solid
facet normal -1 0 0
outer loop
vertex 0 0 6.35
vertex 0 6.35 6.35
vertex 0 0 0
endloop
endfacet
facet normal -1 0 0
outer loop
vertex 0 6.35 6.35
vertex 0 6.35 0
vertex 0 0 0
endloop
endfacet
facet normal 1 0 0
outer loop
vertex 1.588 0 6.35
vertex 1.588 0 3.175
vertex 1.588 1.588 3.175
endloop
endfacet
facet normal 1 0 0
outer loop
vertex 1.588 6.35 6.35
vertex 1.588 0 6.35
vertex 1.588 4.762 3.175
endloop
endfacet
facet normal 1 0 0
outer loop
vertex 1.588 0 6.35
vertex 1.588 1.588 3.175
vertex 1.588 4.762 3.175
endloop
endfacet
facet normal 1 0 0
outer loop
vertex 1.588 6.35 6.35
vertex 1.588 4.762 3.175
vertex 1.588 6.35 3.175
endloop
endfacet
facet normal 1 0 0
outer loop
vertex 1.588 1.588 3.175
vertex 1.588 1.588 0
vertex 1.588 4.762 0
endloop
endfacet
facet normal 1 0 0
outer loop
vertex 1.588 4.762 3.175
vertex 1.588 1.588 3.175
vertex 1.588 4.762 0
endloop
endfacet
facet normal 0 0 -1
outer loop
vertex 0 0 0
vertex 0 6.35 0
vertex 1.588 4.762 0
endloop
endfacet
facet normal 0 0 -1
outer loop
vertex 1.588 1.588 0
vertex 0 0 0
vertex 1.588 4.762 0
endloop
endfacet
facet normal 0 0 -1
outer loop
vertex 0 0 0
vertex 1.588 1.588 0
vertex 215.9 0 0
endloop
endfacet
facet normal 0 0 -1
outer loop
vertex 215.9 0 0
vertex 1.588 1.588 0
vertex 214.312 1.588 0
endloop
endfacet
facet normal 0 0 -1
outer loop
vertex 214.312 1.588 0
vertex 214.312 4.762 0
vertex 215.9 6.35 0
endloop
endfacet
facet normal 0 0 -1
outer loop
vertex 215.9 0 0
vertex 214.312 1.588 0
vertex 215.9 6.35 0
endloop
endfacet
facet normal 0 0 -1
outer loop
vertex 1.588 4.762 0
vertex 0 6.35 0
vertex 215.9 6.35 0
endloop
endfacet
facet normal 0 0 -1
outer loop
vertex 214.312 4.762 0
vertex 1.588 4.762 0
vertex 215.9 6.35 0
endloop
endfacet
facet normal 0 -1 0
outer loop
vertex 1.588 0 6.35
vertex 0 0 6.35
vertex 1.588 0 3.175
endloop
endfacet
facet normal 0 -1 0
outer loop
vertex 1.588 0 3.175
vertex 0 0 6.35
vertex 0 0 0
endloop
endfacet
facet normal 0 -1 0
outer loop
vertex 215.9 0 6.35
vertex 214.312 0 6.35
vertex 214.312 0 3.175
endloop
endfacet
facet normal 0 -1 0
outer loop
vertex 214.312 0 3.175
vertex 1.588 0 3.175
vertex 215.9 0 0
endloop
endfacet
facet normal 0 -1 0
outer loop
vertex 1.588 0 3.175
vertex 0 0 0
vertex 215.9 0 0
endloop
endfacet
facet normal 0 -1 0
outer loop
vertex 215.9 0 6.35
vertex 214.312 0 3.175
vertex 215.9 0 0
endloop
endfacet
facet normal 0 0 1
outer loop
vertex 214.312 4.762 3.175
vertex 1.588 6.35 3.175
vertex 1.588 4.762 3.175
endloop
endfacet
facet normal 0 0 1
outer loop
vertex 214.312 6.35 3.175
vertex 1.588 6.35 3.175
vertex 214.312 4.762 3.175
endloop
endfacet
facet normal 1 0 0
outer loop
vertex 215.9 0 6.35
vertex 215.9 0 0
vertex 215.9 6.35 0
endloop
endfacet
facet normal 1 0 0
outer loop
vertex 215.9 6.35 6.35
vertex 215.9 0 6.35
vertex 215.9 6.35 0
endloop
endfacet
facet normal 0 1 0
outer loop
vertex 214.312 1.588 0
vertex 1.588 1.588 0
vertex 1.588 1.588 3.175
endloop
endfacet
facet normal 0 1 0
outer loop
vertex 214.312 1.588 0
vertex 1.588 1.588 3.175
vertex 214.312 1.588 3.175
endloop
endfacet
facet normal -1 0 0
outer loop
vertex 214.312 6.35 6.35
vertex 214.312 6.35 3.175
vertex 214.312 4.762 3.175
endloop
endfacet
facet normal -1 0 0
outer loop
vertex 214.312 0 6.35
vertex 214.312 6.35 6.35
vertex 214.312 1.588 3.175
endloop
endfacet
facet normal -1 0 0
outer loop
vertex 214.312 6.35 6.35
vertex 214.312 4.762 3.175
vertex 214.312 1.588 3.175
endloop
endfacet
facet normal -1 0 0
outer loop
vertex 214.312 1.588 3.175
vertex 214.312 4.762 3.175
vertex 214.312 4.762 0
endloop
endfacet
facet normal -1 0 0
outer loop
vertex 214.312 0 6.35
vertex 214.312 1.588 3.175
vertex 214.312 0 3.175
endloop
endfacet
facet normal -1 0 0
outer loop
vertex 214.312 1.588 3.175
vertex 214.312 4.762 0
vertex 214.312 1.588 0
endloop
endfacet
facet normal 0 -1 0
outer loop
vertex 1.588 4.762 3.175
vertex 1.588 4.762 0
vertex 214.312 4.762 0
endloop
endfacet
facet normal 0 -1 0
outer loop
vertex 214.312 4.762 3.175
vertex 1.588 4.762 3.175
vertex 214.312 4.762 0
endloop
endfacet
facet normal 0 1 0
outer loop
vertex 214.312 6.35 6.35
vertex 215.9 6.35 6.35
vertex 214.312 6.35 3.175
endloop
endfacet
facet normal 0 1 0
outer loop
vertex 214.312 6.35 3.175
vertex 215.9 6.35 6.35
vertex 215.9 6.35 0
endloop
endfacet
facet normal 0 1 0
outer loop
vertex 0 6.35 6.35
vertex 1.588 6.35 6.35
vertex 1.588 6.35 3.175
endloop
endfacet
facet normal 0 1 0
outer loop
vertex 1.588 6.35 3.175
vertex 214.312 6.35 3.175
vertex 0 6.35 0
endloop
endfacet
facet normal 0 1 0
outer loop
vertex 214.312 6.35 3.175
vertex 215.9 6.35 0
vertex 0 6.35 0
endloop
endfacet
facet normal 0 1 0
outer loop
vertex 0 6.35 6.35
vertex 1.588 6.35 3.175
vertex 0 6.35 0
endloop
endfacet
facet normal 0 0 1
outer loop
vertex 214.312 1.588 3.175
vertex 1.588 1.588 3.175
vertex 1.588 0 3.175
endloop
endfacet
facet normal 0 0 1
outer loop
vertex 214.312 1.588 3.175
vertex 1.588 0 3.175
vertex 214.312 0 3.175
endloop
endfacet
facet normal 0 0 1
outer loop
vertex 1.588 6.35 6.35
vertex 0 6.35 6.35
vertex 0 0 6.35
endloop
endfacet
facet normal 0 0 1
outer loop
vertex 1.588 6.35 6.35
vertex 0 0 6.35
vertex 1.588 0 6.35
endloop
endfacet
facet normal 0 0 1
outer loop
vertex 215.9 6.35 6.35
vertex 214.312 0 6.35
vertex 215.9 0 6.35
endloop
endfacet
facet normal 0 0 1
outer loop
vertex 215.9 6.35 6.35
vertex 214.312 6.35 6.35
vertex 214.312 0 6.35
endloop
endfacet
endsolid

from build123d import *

# Parameters (mm, degrees)
F0_W     = 215.9
F0_H     = 6.35
F0_W_2   = 212.725
F0_H_2   = 3.175
F1_DEPTH = 3.175
F3_DEPTH = 3.175


# Not quite as in the source:
# - a length typed as a fraction of an inch, garbled in the dataset ("3 / 203.2 mm" for 3/8 in), is restored


with BuildPart() as f1:
    # F0 (on Top) → F1 (new body)
    with BuildSketch(Plane.XY):
        with Locations((107.95, 3.175)):
            Rectangle(F0_W, F0_H)
        with Locations((107.95, 3.175)):
            Rectangle(F0_W_2, F0_H_2, mode=Mode.SUBTRACT)
    extrude(amount=F1_DEPTH)

    # F2 (on face) → F3 (join)
    with BuildSketch(Plane.XY.offset(3.175)):
        Polygon((1.5875, 0), (1.5875, 1.5875), (1.5875, 4.7625), (1.5875, 6.35), (0, 6.35), (0, 0), align=None)
        Polygon((214.3125, 4.7625), (214.3125, 1.5875), (214.3125, 0), (215.9, 0), (215.9, 6.35), (214.3125, 6.35), align=None)
    extrude(amount=F3_DEPTH)


solid = f1.part
